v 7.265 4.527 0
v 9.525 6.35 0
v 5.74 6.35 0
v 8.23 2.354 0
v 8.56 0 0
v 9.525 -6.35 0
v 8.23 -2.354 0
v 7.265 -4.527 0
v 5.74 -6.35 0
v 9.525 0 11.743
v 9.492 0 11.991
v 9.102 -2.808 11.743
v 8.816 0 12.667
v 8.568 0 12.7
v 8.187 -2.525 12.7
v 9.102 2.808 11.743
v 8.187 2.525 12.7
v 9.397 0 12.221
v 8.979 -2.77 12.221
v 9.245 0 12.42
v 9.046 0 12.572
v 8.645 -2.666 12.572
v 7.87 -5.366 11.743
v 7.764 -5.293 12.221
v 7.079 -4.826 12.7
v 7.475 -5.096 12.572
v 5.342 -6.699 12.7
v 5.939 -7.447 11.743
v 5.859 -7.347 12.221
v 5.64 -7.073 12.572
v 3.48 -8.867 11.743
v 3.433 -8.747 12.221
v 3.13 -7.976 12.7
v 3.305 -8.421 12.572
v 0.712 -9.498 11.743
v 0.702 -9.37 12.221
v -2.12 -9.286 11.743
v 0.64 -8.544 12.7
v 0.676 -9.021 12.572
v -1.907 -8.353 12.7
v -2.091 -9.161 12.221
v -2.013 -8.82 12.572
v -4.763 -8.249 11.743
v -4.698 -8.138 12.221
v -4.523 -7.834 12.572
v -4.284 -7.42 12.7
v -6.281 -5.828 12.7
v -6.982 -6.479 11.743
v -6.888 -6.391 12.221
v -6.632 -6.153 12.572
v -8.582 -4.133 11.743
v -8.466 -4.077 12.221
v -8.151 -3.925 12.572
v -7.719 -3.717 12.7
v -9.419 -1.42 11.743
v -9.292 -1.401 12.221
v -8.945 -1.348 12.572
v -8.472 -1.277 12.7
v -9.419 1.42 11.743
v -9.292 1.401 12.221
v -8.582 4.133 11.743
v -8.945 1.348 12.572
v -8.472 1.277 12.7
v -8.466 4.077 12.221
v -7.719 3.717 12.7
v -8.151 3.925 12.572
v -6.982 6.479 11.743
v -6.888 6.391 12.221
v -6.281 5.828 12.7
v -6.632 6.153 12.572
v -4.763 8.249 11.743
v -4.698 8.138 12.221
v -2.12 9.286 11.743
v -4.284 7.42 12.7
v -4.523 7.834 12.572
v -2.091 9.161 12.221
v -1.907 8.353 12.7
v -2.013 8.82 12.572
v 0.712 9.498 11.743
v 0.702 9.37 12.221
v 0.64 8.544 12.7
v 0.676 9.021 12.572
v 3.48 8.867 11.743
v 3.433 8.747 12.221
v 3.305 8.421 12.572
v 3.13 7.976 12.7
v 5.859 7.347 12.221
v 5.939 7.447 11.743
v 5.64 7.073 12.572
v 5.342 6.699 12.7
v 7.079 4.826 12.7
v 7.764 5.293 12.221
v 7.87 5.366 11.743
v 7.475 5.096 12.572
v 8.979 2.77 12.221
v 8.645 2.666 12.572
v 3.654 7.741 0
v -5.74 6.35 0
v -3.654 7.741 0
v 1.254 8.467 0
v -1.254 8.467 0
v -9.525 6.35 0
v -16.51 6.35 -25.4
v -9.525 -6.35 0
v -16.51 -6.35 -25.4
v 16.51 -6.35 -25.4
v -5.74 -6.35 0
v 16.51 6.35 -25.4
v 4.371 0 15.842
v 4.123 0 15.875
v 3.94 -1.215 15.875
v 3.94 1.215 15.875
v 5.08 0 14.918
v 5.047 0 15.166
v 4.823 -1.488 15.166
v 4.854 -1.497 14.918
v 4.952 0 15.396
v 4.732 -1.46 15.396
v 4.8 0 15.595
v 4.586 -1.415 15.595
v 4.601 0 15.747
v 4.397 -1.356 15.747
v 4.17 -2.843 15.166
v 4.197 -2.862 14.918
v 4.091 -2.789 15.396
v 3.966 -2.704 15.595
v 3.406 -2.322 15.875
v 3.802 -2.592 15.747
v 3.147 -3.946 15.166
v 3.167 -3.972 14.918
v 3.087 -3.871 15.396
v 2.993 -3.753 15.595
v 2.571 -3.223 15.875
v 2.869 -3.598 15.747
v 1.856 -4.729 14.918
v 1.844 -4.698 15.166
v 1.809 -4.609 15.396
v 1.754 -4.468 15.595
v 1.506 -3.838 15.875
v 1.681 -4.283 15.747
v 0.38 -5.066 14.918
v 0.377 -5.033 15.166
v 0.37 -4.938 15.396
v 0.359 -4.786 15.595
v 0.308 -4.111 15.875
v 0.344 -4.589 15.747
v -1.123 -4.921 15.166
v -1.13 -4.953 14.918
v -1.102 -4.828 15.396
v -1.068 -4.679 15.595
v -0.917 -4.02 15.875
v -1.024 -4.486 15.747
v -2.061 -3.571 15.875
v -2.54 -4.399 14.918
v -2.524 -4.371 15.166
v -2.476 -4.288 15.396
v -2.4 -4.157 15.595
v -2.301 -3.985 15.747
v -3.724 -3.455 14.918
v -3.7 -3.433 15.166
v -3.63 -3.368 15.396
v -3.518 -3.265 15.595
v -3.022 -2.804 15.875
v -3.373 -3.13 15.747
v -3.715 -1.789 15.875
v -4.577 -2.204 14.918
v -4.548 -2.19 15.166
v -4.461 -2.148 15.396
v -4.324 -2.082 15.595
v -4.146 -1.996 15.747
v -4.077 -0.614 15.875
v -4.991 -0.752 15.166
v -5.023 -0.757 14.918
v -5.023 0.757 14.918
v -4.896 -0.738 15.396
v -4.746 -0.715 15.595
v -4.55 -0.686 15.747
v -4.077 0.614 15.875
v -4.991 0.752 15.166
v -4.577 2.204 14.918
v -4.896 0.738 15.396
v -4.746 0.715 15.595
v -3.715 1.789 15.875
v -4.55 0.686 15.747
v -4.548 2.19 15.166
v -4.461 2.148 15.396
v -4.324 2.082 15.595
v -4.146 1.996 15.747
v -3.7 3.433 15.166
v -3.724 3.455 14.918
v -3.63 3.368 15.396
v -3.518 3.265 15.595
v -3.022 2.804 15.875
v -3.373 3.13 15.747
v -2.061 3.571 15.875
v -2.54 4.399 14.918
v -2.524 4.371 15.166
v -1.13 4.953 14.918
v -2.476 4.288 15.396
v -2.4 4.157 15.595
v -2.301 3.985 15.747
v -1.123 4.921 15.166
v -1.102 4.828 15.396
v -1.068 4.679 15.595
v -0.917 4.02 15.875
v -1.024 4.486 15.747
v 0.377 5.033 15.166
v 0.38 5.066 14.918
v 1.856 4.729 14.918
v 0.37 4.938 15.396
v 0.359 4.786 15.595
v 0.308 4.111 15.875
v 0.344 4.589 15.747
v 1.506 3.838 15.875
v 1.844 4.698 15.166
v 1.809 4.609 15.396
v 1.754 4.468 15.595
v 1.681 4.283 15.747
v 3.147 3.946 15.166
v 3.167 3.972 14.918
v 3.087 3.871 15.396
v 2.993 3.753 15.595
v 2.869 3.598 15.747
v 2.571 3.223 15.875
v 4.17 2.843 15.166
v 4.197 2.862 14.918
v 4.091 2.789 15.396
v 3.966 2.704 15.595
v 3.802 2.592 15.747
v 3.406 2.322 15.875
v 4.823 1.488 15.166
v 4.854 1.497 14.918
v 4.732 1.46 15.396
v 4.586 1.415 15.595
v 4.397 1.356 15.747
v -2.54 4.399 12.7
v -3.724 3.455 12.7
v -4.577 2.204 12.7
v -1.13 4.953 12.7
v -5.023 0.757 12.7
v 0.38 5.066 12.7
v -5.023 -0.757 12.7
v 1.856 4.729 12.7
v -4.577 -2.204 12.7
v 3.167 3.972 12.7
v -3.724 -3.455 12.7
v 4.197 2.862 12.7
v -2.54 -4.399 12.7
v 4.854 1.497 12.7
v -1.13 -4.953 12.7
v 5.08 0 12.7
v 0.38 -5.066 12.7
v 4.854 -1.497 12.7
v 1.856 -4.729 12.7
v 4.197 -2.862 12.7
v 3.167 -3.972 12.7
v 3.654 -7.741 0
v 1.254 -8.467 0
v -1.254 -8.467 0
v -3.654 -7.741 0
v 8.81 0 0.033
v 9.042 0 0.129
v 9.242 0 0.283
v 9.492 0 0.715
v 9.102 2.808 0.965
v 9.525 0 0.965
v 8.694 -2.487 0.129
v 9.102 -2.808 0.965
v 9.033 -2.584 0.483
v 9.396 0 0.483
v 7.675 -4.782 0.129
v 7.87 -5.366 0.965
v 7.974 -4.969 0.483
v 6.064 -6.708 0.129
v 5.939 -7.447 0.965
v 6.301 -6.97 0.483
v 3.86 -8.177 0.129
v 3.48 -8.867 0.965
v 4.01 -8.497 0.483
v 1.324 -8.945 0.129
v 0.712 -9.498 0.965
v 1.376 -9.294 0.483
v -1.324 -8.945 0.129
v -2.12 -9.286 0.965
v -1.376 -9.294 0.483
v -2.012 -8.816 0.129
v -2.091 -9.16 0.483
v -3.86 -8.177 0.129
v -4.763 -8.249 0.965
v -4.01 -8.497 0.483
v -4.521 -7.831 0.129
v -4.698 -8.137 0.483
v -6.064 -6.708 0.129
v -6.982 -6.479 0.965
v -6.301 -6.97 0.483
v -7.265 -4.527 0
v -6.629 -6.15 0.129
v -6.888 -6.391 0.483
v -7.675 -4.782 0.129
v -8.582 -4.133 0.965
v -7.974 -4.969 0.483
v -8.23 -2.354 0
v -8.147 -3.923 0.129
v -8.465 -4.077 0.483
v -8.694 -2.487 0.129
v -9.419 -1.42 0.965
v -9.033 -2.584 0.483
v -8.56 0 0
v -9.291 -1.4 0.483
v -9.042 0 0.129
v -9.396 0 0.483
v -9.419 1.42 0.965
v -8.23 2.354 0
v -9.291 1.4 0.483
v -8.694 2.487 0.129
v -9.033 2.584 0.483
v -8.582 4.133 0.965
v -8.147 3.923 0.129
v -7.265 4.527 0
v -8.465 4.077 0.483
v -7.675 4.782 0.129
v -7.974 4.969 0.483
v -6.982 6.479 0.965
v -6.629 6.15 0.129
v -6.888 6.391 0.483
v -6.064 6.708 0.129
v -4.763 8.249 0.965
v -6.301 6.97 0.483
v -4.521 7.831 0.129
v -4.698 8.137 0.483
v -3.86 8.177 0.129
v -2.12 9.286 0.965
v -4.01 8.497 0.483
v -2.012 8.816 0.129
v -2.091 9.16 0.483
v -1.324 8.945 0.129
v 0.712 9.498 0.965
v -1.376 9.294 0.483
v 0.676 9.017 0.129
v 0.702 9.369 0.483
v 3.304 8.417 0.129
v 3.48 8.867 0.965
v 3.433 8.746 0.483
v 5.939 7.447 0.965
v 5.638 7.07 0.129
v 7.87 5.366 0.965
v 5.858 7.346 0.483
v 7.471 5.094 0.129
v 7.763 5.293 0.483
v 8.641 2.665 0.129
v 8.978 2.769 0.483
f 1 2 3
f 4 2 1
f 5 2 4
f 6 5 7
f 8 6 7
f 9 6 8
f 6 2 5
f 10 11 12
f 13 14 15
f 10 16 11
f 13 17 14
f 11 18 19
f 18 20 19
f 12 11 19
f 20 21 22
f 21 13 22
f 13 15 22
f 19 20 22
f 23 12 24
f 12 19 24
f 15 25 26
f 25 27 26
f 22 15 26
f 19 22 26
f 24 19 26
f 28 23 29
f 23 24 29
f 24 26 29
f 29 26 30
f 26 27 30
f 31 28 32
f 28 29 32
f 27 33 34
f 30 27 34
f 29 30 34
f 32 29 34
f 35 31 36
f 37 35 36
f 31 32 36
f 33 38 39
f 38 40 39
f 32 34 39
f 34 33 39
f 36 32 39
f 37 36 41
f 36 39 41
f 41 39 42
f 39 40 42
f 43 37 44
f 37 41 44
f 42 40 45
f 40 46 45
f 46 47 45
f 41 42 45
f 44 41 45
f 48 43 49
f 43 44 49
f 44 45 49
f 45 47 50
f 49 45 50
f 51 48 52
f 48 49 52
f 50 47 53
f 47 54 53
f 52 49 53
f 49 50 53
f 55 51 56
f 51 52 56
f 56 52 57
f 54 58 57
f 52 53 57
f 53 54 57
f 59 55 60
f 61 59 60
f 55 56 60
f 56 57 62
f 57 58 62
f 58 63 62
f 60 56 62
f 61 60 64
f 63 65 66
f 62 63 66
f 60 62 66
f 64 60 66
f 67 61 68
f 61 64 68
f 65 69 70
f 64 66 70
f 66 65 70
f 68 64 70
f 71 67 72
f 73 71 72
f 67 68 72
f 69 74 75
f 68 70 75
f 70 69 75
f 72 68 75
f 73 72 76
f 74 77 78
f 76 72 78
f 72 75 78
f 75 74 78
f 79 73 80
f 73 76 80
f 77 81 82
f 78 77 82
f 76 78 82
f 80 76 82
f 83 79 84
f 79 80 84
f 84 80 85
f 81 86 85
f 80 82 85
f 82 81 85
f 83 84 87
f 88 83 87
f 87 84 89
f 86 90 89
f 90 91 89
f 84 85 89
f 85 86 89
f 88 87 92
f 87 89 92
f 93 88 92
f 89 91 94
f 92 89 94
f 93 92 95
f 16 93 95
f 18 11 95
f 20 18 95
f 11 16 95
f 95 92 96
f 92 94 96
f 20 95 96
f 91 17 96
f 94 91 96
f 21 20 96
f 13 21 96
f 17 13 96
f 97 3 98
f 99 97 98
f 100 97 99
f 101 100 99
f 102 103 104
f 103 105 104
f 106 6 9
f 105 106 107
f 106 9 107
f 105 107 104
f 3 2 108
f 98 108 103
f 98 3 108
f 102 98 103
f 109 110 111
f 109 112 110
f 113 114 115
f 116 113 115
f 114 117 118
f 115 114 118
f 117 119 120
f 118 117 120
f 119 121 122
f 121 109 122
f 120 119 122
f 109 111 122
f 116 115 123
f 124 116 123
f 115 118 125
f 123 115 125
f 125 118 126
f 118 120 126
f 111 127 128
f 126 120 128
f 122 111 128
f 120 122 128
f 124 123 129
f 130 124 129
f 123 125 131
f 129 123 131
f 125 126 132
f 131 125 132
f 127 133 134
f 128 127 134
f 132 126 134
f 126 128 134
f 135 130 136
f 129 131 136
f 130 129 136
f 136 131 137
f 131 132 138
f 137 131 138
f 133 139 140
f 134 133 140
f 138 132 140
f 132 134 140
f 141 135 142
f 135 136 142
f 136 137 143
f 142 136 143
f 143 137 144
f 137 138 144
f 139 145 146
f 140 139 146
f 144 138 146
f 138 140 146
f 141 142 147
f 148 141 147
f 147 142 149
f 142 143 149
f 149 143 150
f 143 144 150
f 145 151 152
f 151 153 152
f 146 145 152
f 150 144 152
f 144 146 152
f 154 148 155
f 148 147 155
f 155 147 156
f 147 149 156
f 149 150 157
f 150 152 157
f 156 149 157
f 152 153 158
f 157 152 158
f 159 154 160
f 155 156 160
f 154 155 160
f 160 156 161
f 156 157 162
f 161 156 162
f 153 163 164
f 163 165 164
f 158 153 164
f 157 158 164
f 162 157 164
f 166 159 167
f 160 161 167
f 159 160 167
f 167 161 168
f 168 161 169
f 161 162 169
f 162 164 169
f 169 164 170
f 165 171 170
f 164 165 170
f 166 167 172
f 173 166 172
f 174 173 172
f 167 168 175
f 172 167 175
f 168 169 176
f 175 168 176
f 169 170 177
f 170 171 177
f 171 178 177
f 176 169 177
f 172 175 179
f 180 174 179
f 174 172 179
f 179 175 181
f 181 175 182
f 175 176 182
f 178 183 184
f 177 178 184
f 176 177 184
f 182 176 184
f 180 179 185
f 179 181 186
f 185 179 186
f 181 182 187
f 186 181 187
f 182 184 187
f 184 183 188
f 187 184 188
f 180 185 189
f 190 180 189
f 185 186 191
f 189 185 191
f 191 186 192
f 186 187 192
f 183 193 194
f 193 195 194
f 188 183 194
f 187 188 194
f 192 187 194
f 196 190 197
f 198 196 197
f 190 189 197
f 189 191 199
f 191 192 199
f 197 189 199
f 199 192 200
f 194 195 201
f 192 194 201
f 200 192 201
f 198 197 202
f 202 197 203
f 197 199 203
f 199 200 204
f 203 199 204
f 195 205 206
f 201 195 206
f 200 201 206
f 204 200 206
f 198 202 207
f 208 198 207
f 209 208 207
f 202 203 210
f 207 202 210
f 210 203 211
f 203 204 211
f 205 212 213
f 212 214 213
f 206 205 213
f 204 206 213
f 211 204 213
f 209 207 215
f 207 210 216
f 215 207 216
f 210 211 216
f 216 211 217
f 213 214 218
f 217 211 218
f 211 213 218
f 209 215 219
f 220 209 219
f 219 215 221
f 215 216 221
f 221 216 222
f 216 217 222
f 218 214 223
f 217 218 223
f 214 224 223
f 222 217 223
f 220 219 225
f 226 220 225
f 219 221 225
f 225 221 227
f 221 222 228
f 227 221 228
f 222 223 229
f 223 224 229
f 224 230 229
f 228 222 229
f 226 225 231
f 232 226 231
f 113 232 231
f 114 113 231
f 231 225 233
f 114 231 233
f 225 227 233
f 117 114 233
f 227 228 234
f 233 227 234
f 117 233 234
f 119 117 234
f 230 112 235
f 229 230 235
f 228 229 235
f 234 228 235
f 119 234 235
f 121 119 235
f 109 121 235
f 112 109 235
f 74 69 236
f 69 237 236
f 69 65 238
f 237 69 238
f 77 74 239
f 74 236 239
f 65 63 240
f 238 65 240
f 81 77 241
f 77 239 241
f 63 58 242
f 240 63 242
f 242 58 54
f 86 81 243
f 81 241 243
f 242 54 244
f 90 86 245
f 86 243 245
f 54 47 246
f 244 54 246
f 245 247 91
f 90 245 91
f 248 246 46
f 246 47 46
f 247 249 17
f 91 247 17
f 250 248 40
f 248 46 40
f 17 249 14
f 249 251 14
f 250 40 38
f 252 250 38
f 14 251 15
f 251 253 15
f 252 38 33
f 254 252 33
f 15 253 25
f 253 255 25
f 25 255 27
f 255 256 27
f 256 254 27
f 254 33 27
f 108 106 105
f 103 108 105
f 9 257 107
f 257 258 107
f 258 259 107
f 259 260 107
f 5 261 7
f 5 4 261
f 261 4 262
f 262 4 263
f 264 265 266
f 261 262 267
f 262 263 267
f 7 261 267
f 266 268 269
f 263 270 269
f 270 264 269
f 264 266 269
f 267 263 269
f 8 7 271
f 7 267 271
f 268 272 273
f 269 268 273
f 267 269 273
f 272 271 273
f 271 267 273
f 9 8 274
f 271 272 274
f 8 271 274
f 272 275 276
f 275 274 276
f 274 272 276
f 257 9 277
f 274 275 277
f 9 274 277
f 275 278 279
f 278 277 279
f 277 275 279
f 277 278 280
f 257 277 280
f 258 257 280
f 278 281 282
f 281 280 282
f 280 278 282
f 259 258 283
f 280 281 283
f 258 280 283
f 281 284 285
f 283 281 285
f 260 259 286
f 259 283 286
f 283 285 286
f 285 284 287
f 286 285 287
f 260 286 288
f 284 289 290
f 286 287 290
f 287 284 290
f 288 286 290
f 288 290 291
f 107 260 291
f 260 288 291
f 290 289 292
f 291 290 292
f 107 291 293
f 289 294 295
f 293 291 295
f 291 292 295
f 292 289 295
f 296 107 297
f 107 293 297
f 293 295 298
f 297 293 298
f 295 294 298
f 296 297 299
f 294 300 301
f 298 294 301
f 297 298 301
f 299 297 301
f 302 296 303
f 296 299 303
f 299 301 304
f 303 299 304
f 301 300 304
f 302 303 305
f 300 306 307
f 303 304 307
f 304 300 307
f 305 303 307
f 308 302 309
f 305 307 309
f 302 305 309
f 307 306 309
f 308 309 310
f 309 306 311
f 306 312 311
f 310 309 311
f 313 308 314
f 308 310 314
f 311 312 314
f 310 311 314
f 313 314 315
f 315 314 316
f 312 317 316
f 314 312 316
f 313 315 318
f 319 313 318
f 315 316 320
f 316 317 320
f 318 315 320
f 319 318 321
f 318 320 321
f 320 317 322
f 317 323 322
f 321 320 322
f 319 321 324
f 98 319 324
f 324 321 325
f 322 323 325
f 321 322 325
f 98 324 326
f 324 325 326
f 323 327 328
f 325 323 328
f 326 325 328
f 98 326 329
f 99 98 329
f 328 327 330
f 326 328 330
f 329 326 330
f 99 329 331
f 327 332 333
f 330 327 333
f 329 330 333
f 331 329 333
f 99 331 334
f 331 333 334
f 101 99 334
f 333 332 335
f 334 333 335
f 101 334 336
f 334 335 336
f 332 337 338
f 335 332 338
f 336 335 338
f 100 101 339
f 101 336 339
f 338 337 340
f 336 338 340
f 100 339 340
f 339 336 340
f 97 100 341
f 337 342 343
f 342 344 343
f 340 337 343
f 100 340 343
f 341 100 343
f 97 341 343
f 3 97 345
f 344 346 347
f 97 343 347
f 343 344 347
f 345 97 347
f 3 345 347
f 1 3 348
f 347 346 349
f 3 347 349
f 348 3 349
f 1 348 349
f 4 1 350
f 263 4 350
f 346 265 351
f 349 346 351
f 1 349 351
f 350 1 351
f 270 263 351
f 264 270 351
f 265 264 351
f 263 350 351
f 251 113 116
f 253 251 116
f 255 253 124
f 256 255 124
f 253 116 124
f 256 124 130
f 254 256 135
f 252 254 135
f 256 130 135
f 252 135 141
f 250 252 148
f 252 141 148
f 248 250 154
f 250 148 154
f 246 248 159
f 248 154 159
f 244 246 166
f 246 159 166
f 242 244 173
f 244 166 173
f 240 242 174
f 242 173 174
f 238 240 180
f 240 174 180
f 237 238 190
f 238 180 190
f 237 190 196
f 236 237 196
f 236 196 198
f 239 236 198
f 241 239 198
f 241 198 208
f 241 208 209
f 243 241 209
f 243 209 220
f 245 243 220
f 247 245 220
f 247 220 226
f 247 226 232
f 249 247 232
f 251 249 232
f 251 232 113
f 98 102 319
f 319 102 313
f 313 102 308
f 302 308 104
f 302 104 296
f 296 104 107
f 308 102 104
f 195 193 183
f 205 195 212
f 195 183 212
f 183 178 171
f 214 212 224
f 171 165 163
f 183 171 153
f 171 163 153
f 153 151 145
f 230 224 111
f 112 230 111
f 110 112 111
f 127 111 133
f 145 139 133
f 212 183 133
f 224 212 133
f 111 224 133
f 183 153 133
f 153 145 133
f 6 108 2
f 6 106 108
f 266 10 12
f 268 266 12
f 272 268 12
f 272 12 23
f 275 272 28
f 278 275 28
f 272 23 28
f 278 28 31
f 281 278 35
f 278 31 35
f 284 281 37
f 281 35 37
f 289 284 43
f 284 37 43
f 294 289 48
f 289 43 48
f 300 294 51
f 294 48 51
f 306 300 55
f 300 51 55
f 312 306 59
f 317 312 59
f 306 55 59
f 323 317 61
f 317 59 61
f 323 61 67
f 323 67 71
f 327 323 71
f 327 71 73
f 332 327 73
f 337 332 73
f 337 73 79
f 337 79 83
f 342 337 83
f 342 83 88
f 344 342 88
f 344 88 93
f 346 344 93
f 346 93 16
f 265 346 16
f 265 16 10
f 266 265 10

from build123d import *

# Parameters (mm, degrees)
F3_DEPTH = 6.35


with BuildPart() as f1:
    # F0 (on Front) → F1 (revolve)
    with BuildSketch(Plane.XZ):
        with BuildLine():
            Line((0, 15.875), (0, 0))
            Line((0, 0), (8.5598, 0))
            ThreePointArc((8.5598, 0), (9.242299, 0.282701), (9.525, 0.9652))
            Line((9.525, 0.9652), (9.525, 11.742871))
            ThreePointArc((9.525, 11.742871), (9.244663, 12.419663), (8.567871, 12.7))
            Line((8.567871, 12.7), (5.08, 12.7))
            Line((5.08, 12.7), (5.08, 14.917871))
            ThreePointArc((5.08, 14.917871), (4.799663, 15.594663), (4.122871, 15.875))
            Line((4.122871, 15.875), (0, 15.875))
        make_face()
    revolve(axis=Axis((0, 0, 7.9375), (0, 0, -1)))

    # F2 (on Front) → F3 (join, symmetric)
    with BuildSketch(Plane.XZ):
        Polygon((9.525, 0), (0, 0), (0, -25.4), (16.51, -25.4), align=None)
    extrude(amount=F3_DEPTH, both=True)

    # F4: F1 across plane


with BuildPart() as f1_1:
    add(f1.part)
    add(f1.part.mirror(Plane.YZ))


solid = f1_1.part
